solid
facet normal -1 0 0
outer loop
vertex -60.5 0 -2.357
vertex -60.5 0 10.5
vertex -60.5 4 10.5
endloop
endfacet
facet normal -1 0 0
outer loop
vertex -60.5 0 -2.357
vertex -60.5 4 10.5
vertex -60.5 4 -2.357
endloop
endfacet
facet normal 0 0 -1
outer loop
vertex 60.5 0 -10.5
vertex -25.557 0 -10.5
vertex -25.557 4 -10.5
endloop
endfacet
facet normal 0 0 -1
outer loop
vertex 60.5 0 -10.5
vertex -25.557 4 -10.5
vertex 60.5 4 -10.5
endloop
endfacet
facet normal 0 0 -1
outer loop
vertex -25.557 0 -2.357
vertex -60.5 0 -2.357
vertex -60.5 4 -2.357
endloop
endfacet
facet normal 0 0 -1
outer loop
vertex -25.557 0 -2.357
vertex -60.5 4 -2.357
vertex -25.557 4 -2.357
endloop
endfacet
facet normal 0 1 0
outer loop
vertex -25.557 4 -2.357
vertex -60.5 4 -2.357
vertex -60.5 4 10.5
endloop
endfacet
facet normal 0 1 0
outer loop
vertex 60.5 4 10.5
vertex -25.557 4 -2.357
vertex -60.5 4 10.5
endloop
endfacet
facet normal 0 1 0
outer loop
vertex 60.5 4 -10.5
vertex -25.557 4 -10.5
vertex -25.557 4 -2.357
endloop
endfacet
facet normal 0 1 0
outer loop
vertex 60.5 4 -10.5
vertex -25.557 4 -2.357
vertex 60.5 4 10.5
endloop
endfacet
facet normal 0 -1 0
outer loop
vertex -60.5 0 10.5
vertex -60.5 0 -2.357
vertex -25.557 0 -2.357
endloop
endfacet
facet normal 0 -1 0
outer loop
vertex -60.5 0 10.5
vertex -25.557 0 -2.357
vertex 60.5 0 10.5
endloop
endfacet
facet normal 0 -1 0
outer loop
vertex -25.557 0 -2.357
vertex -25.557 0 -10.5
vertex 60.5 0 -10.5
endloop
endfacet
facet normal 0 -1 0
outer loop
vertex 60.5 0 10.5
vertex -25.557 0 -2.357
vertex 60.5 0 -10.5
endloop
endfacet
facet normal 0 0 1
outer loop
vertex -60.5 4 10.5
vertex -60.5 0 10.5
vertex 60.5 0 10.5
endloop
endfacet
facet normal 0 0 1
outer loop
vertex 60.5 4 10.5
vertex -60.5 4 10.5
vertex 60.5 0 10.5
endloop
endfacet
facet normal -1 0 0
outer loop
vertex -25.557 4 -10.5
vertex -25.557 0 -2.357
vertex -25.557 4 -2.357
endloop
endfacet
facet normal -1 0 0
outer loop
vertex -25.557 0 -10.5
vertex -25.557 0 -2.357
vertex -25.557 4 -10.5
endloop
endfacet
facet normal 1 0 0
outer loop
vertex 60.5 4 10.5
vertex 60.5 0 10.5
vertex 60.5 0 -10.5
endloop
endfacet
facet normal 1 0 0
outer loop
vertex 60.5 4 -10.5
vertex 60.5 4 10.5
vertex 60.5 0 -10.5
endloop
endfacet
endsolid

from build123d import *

# Parameters (mm, degrees)
SKETCH1_W               = 121
SKETCH1_H               = 21
BOSS_EXTRUDE1_DEPTH     = 4
CUT_EXTRUDE1_DEPTH      = 62.534543144
CUT_EXTRUDE1_DEPTH_BACK = 62.534543144
SKETCH2_W               = 36.59359186
SKETCH2_H               = 8.142757597


with BuildPart() as part:
    # Sketch1 → Boss-Extrude1 (new body)
    with BuildSketch(Plane(origin=(0, 0, 0), x_dir=(1, 0, 0), z_dir=(0, 1, 0))):
        Rectangle(SKETCH1_W, SKETCH1_H)
    extrude(amount=BOSS_EXTRUDE1_DEPTH)

    # Sketch2 → Cut-Extrude1 (cut, two sides: drawn at the far end of the back side and taken through both)
    with BuildSketch(Plane(origin=(0, 0, 0), x_dir=(1, 0, 0), z_dir=(0, 1, 0)).offset(-CUT_EXTRUDE1_DEPTH_BACK)):
        with Locations((-43.854273263, 6.428621202)):
            Rectangle(SKETCH2_W, SKETCH2_H)
    extrude(amount=CUT_EXTRUDE1_DEPTH + CUT_EXTRUDE1_DEPTH_BACK, mode=Mode.SUBTRACT)


solid = part.part
